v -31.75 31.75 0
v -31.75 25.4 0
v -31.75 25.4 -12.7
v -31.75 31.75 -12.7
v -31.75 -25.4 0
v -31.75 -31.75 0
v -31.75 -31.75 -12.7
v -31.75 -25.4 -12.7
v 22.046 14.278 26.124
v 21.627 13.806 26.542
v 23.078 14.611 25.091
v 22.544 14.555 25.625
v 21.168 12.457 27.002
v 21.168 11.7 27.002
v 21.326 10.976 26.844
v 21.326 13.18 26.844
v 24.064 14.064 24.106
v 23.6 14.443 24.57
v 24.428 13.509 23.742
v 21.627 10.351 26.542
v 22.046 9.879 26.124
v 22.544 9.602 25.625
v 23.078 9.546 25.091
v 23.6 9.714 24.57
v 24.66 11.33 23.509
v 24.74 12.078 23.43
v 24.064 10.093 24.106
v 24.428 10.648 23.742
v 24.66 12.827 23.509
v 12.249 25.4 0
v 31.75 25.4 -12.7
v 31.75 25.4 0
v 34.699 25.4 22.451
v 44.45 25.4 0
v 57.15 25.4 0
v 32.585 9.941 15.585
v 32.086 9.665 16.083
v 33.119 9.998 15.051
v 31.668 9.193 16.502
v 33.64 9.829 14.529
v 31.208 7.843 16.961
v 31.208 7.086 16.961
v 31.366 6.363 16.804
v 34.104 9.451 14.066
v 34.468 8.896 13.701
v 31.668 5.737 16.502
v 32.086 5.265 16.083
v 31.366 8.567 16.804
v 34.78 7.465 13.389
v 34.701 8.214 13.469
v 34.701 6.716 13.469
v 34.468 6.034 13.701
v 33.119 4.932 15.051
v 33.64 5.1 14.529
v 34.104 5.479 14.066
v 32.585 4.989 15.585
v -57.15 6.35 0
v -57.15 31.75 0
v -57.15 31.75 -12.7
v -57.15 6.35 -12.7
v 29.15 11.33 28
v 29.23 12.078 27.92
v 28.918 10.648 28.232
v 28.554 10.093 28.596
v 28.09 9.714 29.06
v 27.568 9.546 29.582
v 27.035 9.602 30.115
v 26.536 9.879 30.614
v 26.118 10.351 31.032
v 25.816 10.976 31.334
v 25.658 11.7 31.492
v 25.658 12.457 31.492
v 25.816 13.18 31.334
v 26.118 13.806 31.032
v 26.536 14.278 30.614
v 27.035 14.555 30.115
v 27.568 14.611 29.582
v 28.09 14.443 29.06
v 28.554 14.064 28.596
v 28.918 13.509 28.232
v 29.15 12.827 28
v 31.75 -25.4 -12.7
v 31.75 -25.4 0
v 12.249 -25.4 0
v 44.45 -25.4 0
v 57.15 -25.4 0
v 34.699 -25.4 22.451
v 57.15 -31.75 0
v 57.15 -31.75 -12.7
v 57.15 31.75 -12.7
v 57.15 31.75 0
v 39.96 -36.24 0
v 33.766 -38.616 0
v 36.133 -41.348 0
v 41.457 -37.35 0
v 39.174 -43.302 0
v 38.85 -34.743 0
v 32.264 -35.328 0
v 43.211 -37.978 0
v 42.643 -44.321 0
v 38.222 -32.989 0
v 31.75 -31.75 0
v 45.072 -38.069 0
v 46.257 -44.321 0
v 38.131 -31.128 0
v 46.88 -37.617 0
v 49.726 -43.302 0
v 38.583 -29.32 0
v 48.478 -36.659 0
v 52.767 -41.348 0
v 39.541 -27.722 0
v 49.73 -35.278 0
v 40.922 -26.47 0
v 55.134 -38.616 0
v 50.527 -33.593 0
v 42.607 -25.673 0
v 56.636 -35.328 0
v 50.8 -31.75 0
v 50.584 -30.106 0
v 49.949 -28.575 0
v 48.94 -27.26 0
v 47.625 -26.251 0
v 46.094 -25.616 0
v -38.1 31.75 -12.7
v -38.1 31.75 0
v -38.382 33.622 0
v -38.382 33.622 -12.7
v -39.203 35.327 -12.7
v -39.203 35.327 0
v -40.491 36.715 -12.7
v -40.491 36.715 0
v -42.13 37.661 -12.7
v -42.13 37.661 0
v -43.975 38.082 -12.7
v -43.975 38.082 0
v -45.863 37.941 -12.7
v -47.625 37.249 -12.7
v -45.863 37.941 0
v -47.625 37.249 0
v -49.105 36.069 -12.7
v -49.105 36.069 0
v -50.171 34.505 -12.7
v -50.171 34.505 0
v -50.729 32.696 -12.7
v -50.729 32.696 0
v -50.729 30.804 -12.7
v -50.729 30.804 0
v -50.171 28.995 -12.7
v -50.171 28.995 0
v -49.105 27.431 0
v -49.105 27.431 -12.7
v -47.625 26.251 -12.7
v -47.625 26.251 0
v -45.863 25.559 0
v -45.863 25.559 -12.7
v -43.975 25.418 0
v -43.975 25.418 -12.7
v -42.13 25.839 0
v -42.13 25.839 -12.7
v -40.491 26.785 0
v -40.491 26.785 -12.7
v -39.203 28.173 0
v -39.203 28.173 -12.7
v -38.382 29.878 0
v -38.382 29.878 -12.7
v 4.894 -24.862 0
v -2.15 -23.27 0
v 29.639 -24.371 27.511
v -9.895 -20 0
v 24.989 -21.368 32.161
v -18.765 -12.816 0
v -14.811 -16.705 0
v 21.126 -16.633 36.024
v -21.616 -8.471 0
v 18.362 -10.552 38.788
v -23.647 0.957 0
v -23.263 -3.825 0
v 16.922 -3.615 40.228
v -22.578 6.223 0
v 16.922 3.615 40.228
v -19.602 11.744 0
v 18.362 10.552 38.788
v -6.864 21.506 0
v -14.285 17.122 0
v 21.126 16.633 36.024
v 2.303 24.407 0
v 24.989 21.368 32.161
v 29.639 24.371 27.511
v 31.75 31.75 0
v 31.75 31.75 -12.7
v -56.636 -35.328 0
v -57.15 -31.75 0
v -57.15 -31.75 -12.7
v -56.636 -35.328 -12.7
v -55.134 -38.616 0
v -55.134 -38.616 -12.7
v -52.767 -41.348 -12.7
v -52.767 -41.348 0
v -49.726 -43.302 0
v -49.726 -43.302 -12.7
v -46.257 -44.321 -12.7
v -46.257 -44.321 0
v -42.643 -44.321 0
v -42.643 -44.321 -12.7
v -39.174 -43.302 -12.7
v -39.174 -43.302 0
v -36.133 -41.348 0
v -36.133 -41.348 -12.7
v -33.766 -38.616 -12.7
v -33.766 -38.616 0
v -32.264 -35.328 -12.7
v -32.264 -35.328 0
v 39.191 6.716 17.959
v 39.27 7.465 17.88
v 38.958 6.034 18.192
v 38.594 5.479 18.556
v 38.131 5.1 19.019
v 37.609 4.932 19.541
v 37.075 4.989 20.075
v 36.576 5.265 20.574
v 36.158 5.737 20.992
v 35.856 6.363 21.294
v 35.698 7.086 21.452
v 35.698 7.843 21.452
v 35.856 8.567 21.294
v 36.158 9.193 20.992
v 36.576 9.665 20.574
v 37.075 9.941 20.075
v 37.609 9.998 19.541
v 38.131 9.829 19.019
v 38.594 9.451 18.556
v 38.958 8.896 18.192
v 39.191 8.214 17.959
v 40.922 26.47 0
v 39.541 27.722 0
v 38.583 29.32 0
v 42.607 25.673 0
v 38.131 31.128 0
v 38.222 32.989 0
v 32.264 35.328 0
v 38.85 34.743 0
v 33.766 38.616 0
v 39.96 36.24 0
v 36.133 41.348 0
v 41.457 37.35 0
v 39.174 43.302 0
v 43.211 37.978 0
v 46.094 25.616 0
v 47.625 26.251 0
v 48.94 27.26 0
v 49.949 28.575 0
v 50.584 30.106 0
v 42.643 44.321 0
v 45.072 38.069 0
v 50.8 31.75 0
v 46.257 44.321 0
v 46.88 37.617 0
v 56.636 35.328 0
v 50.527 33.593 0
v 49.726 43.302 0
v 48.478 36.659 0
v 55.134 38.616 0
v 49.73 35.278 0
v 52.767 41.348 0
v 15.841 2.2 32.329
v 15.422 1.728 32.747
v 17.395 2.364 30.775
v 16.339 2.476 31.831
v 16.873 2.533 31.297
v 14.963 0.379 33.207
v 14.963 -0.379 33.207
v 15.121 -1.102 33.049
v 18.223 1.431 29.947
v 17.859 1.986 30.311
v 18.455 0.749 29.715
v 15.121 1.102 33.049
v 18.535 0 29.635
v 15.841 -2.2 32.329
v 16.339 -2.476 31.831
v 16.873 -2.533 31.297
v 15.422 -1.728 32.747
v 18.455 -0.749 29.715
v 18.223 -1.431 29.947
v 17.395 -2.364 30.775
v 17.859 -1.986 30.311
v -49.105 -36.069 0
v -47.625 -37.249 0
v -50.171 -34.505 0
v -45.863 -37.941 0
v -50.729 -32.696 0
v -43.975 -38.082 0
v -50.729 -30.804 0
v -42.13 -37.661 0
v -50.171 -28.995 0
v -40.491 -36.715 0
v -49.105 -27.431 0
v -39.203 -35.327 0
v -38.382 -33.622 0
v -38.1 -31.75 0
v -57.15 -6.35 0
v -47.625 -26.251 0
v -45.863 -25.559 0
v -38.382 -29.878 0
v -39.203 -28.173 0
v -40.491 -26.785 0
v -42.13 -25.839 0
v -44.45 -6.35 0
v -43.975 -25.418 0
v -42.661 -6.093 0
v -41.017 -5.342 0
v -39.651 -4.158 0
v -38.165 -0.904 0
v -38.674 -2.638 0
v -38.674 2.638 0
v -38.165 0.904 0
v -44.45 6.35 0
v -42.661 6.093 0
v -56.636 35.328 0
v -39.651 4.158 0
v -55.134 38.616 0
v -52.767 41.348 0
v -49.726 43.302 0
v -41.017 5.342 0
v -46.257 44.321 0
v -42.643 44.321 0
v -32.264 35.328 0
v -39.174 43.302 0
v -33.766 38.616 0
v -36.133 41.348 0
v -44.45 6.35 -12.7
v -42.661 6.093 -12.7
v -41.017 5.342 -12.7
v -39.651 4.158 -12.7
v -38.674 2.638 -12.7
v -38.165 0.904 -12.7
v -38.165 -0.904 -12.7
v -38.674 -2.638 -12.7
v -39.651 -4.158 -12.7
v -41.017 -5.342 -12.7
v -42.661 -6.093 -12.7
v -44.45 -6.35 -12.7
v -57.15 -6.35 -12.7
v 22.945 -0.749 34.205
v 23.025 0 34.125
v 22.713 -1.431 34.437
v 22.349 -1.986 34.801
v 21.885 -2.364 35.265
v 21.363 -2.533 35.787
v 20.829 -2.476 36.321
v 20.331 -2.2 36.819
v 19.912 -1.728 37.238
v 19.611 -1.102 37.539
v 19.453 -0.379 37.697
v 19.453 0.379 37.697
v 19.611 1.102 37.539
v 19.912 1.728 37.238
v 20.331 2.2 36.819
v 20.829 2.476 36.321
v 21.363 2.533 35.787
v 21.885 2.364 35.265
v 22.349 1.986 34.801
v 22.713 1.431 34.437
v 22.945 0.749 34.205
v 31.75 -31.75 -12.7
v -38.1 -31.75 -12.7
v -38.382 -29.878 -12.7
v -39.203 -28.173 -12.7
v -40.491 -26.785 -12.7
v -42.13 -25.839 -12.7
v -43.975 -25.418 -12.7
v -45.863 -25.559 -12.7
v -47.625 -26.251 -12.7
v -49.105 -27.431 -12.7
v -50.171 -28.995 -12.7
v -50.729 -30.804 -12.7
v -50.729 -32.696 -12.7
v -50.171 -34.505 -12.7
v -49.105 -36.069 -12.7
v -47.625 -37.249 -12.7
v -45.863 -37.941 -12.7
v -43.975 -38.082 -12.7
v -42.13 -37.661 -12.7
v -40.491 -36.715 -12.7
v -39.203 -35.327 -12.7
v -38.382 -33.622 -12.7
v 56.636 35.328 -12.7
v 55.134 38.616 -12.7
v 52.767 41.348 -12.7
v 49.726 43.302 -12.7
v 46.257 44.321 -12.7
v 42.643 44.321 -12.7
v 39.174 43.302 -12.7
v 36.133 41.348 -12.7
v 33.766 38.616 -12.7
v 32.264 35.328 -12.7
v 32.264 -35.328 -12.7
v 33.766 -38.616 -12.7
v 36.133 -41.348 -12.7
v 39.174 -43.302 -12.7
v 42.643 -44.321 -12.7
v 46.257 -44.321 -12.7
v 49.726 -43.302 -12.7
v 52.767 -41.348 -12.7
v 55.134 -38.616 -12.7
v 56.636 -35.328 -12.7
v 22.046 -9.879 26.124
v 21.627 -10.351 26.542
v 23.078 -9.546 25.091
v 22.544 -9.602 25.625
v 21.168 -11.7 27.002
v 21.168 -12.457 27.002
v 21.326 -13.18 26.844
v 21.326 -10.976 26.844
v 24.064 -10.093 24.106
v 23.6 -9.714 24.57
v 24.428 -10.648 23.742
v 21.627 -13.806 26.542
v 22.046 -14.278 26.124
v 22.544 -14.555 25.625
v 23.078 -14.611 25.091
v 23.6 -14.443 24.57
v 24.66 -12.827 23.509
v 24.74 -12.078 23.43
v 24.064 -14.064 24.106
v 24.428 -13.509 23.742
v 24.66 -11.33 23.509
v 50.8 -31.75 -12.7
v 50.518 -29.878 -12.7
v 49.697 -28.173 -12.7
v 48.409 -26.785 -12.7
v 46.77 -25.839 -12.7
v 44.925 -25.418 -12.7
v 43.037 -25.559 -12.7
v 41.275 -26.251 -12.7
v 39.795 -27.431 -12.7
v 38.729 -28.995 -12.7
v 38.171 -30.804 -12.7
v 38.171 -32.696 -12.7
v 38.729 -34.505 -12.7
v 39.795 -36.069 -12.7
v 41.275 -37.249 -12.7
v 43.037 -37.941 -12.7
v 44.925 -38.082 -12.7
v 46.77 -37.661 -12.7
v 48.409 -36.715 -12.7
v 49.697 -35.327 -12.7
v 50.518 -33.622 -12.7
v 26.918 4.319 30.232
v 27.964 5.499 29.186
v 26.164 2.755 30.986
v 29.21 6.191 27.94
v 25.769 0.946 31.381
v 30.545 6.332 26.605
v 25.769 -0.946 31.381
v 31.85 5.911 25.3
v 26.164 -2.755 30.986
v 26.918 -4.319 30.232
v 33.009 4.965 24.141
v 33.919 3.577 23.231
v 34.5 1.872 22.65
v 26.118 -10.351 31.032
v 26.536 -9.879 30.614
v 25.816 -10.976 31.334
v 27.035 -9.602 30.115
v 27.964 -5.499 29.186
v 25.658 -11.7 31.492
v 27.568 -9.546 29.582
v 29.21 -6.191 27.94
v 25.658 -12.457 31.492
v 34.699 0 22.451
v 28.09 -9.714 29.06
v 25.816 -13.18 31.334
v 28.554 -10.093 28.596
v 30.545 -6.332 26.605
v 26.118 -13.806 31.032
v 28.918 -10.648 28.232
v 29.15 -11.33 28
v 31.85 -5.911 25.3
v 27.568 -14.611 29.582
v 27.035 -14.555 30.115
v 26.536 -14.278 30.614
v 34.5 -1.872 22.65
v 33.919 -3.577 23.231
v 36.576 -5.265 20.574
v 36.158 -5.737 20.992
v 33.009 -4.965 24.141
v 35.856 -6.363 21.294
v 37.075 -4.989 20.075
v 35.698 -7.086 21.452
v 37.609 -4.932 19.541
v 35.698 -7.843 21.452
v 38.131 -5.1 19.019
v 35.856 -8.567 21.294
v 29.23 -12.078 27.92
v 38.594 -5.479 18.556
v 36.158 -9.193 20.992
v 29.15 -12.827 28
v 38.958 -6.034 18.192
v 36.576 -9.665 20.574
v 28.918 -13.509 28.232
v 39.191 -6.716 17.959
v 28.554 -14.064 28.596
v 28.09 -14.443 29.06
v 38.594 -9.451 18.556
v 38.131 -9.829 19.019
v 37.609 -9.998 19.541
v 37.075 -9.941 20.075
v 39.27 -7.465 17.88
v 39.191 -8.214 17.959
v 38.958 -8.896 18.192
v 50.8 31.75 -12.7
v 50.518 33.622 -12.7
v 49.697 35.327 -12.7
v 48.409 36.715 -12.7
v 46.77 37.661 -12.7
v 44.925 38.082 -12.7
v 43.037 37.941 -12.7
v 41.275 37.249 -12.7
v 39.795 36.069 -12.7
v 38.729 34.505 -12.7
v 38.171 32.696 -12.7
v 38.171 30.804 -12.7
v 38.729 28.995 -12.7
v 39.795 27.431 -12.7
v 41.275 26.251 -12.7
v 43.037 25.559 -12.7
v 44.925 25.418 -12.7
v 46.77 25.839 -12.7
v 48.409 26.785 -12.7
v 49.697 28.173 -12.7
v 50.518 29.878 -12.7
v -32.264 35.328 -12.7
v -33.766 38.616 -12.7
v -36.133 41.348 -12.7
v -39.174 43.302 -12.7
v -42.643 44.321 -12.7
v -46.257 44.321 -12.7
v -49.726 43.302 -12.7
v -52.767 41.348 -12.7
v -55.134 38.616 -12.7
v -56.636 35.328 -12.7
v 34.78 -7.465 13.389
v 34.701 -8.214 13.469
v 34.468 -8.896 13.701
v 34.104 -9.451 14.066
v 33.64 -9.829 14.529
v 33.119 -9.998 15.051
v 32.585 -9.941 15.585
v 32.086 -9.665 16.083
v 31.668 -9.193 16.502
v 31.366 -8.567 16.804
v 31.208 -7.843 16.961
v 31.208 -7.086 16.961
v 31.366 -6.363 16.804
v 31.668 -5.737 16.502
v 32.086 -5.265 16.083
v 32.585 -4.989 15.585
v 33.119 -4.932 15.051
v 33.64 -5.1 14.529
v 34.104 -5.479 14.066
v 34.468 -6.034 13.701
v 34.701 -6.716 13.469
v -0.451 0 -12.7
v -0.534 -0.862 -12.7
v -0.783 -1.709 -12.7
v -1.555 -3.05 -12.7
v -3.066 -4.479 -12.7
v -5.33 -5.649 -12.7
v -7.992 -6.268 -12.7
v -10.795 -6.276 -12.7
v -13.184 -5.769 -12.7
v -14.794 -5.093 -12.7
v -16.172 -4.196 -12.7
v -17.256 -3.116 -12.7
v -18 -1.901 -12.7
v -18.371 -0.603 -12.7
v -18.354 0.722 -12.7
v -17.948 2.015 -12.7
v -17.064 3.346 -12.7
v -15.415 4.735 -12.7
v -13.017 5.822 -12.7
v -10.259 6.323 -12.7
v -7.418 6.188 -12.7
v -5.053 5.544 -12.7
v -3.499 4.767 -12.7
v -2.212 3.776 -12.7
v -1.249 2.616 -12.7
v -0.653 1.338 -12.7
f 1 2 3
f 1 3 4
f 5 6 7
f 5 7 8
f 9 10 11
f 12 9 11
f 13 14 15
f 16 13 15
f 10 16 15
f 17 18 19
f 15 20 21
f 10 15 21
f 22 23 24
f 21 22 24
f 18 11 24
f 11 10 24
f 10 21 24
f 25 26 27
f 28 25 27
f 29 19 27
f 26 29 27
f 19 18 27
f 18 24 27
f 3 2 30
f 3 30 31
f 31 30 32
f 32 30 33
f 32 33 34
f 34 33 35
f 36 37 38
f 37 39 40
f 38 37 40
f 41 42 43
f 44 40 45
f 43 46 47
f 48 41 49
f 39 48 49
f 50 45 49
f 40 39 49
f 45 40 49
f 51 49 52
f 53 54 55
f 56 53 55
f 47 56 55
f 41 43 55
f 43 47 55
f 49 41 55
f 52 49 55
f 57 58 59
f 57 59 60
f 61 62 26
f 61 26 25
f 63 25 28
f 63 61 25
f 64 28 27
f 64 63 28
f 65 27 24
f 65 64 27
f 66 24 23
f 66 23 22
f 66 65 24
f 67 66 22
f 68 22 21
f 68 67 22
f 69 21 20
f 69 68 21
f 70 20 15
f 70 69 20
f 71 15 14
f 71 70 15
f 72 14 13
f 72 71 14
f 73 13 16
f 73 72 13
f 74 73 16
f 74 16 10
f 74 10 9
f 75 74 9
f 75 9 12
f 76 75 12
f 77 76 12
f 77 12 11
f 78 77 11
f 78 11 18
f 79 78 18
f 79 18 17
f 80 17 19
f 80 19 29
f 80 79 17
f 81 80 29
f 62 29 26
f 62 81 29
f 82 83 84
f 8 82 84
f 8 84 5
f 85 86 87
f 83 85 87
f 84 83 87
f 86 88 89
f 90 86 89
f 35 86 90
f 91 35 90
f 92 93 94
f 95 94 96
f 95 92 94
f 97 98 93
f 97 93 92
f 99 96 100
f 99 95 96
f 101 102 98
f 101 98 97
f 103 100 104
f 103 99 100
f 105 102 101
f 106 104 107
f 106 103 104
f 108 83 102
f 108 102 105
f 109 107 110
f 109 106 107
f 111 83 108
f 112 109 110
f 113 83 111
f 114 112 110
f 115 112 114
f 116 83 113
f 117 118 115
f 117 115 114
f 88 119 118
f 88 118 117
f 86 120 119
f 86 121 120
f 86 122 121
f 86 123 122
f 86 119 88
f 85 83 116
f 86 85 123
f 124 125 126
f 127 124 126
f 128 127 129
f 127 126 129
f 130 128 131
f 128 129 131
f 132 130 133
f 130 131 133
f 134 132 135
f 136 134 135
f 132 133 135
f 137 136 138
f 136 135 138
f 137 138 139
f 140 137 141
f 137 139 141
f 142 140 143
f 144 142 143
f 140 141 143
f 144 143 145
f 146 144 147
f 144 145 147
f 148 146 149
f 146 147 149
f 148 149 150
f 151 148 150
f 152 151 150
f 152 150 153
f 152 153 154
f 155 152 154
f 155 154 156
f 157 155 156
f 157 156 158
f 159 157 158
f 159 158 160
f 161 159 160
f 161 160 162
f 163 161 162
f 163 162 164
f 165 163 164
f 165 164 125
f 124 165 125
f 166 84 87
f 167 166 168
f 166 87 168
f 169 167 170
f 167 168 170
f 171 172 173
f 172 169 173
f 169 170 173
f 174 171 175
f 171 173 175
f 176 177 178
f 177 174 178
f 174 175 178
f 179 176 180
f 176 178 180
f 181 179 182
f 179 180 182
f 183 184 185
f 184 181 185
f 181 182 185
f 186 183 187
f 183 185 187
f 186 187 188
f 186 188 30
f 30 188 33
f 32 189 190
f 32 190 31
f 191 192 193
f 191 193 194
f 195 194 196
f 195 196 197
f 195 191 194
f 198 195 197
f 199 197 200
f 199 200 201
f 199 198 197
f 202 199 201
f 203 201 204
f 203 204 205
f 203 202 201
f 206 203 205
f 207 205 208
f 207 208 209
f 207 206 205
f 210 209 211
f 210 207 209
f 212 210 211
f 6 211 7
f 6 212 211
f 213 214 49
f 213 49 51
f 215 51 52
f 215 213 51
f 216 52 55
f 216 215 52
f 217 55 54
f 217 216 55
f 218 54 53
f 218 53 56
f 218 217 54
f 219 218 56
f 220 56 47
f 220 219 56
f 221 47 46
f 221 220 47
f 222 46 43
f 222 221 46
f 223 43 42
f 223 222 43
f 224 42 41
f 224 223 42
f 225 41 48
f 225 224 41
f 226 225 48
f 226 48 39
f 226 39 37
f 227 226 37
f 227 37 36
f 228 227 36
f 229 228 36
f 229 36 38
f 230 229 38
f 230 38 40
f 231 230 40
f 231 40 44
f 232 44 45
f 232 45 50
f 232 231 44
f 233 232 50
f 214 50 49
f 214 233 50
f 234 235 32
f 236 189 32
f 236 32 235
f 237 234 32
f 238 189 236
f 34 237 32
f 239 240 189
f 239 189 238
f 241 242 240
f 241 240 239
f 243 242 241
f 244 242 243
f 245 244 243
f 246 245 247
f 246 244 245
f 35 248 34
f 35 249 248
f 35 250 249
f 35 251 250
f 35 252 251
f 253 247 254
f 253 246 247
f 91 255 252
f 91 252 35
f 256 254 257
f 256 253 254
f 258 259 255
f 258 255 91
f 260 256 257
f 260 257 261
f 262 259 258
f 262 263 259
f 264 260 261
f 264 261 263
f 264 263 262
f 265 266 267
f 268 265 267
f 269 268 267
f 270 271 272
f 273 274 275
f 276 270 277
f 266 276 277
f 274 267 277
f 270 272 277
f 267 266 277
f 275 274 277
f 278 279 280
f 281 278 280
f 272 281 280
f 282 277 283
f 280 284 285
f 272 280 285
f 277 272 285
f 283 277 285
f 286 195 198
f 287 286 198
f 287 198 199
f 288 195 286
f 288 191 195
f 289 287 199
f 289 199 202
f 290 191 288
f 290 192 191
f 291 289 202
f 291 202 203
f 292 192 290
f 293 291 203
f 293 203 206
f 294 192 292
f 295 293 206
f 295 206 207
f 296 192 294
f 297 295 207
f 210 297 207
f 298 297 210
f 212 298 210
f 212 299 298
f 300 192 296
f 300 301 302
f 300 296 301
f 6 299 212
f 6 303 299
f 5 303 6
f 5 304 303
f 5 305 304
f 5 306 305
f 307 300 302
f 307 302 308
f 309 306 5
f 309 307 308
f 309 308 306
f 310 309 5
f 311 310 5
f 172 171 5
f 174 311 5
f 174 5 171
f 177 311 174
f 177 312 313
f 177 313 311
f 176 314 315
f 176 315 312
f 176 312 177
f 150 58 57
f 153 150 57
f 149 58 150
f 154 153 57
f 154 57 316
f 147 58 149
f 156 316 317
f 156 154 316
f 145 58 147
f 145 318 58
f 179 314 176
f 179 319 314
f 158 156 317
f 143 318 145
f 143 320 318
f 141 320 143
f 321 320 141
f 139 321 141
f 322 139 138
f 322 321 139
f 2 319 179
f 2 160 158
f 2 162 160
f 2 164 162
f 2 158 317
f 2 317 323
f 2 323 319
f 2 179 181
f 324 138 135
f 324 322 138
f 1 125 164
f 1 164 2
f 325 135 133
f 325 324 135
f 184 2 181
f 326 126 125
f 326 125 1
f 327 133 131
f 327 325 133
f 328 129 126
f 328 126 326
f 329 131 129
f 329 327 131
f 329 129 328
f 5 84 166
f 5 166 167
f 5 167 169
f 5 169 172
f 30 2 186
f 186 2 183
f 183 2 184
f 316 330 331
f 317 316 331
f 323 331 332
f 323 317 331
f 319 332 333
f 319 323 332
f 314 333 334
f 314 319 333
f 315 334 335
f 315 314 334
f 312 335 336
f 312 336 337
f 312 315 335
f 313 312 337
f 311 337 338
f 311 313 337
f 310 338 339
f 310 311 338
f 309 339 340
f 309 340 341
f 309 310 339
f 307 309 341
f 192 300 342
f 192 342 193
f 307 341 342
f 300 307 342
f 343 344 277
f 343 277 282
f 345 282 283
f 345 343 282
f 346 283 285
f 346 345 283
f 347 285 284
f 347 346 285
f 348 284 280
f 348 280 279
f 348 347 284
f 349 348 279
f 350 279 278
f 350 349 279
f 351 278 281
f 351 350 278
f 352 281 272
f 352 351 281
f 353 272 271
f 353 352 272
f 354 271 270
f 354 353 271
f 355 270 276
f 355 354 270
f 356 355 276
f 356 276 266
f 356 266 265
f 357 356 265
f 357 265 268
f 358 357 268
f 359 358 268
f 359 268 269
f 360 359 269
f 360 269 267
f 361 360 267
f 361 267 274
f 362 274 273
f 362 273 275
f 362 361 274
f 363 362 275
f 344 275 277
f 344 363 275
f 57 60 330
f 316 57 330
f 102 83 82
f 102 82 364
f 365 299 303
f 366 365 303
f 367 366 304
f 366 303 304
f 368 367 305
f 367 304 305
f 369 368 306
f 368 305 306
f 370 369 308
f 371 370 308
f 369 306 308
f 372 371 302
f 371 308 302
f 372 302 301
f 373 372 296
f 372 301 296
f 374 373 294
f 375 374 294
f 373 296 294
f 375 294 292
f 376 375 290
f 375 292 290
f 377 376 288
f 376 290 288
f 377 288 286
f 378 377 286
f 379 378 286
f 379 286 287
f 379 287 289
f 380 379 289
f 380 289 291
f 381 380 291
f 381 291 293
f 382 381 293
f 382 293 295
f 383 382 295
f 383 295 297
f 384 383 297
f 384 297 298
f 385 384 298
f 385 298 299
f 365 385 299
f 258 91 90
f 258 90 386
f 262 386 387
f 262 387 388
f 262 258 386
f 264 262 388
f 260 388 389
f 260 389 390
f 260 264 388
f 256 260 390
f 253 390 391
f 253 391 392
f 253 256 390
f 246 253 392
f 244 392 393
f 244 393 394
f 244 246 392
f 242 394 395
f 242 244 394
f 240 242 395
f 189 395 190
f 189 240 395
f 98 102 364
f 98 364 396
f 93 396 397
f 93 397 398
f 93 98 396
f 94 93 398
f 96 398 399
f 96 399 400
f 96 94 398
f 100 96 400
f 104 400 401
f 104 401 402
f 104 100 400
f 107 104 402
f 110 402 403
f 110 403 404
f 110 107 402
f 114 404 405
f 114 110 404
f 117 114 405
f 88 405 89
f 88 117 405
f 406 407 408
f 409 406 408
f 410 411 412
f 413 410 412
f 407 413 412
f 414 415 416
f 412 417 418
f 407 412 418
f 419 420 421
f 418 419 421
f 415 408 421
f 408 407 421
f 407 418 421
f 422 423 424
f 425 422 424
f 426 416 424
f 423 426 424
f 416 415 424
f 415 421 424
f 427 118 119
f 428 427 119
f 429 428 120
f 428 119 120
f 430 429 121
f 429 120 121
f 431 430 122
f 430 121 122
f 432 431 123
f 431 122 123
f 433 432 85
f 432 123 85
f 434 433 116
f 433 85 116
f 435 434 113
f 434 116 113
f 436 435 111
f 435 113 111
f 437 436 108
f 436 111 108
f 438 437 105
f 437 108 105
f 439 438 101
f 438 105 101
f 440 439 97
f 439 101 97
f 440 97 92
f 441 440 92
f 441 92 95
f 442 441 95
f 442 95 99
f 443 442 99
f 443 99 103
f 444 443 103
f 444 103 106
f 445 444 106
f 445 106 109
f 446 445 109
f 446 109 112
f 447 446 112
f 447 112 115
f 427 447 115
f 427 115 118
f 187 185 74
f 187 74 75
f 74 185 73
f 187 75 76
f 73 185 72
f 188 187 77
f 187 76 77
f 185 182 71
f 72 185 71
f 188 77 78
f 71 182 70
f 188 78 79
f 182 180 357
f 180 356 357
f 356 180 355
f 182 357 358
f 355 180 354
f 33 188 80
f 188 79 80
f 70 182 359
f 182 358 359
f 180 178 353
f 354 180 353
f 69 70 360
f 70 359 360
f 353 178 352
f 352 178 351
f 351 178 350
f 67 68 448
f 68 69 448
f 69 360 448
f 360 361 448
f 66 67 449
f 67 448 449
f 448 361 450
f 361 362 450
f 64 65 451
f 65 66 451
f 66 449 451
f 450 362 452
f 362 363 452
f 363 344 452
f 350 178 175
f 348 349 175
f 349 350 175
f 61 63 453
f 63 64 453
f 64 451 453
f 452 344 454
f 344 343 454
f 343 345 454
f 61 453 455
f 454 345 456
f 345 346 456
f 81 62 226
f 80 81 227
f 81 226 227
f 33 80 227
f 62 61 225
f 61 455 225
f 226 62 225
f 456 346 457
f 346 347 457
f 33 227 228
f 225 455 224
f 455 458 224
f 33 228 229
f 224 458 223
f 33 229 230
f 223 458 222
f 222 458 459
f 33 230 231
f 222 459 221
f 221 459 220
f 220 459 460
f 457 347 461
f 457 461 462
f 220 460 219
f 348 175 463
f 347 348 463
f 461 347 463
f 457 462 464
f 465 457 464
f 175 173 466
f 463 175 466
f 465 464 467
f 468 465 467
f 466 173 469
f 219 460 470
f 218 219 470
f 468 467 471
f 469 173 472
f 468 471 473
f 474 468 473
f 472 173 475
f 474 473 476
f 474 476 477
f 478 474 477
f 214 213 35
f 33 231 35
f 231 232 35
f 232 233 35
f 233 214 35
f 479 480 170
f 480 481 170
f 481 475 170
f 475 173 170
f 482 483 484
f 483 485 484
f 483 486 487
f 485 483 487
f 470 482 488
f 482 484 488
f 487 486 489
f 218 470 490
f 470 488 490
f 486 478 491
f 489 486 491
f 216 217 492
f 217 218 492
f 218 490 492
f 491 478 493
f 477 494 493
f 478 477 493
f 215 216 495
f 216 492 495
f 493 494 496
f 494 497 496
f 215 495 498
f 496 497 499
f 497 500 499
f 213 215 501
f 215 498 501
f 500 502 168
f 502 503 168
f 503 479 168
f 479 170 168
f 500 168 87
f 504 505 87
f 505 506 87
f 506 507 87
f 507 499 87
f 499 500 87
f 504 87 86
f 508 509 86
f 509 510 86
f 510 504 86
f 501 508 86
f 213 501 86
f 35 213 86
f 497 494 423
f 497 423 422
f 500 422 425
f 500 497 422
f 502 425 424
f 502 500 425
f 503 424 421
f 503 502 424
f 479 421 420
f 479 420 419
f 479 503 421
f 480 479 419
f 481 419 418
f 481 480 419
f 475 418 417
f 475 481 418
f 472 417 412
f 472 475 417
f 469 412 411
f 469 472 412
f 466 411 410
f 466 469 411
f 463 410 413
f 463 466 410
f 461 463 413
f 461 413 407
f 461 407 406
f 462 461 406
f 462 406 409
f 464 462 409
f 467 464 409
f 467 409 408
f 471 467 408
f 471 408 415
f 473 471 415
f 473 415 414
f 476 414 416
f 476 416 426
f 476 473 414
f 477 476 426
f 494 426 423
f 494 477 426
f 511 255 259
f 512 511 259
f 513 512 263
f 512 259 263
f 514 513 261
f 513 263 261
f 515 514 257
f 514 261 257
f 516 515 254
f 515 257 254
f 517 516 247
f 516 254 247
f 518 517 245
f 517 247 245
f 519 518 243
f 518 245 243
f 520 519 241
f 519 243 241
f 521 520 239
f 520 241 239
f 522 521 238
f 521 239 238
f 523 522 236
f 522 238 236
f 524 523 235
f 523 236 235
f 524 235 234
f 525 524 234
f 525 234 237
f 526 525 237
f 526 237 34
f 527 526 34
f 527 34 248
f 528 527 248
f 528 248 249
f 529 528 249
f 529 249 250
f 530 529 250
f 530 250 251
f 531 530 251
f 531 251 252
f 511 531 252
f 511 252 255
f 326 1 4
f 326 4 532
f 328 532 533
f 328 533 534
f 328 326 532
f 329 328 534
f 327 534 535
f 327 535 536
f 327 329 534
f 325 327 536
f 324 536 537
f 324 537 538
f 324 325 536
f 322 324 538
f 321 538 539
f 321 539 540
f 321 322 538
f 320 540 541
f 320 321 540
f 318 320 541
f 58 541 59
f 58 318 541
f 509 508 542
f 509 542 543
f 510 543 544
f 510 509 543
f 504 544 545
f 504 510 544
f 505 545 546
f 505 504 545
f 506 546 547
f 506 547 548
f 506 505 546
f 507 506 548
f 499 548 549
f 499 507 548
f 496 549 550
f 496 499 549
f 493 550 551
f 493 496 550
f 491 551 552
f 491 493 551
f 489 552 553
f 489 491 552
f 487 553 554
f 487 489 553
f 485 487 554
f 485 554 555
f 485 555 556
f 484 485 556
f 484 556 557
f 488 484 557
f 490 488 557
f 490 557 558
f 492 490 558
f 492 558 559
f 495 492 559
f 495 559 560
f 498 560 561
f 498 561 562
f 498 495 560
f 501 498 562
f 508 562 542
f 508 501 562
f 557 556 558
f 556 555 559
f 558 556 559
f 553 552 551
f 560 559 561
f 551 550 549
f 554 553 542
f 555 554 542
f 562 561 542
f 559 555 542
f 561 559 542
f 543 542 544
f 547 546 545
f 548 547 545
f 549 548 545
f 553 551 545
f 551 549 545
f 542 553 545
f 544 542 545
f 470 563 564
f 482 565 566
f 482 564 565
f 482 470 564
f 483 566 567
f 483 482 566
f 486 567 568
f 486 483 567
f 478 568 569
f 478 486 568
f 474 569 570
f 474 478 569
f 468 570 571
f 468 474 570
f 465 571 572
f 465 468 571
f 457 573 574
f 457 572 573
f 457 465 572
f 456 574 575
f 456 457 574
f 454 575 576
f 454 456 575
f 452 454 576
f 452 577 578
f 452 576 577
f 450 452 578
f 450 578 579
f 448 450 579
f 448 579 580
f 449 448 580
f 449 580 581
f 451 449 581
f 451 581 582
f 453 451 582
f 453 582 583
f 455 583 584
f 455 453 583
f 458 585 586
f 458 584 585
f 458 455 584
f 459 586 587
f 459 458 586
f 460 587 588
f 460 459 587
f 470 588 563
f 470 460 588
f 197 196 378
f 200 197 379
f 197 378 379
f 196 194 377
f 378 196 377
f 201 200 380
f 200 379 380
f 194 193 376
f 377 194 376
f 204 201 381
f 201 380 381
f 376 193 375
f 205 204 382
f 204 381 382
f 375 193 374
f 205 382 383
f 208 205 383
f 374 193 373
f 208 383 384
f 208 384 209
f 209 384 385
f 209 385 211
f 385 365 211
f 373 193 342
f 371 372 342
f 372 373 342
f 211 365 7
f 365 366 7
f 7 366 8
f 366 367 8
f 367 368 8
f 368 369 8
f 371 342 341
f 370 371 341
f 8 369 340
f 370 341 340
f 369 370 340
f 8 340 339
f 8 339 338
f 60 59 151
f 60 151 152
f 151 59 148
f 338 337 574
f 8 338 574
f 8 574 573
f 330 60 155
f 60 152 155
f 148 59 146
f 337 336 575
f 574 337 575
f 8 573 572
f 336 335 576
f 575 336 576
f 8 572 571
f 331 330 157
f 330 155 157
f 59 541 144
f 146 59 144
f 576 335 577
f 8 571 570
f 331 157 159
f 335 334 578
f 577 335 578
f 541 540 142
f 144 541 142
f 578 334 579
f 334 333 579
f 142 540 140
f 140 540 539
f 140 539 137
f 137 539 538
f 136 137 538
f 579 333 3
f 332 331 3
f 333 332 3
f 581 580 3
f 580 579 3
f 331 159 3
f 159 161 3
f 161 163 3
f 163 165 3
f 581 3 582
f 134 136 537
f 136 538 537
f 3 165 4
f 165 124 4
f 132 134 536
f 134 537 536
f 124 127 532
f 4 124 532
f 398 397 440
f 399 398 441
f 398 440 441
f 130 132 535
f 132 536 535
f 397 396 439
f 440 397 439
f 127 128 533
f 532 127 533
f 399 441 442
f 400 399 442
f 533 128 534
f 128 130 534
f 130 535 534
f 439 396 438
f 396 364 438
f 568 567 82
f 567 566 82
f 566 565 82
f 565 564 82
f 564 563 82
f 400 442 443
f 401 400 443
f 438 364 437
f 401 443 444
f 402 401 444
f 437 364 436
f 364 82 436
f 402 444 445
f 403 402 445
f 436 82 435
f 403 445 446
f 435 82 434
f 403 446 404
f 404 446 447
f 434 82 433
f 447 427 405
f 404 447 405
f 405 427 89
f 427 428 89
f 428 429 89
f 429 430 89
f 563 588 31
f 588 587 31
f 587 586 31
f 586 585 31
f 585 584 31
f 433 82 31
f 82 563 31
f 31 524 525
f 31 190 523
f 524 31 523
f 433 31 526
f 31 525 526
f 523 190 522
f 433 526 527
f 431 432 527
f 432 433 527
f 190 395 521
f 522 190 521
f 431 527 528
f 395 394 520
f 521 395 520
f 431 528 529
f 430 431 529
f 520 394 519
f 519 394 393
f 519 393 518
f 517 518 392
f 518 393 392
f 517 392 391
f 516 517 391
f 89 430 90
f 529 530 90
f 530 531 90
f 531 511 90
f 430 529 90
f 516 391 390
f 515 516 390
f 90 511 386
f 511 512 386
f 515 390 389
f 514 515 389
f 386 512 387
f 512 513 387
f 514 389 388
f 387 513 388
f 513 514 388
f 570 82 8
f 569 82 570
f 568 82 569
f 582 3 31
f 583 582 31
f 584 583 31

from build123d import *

# Parameters (mm, degrees)
F1_R      = 6.35
F2_DEPTH  = 12.7
F4_DEPTH  = 12.701
F8_R      = 2.54
F10_DEPTH = 6.35
F9_R      = 6.35
F11_DEPTH = 89.8035612107


with BuildPart() as f2:
    # F1 (on Top) → F2 (new body)
    with BuildSketch(Plane.XY):
        with BuildLine():
            ThreePointArc((-31.75, 31.75), (-44.45, 44.45), (-57.15, 31.75))
            Line((-57.15, 31.75), (-57.15, 6.35))
            Line((-57.15, 6.35), (-44.45, 6.35))
            ThreePointArc((-44.45, 6.35), (-38.1, 0), (-44.45, -6.35))
            Line((-44.45, -6.35), (-57.15, -6.35))
            Line((-57.15, -6.35), (-57.15, -31.75))
            ThreePointArc((-57.15, -31.75), (-44.45, -44.45), (-31.75, -31.75))
            Line((-31.75, -31.75), (-31.75, -25.4))
            Line((-31.75, -25.4), (31.75, -25.4))
            Line((31.75, -25.4), (31.75, -31.75))
            ThreePointArc((31.75, -31.75), (44.45, -44.45), (57.15, -31.75))
            Line((57.15, -31.75), (57.15, 31.75))
            ThreePointArc((57.15, 31.75), (44.45, 44.45), (31.75, 31.75))
            Line((31.75, 31.75), (31.75, 25.4))
            Line((31.75, 25.4), (-31.75, 25.4))
            Line((-31.75, 25.4), (-31.75, 31.75))
        make_face()
        with Locations((-44.45, -31.75)):
            Circle(F1_R, mode=Mode.SUBTRACT)
        with Locations((44.45, -31.75)):
            Circle(F1_R, mode=Mode.SUBTRACT)
        with Locations((-44.45, 31.75)):
            Circle(F1_R, mode=Mode.SUBTRACT)
        with Locations((44.45, 31.75)):
            Circle(F1_R, mode=Mode.SUBTRACT)
        with Locations((-44.45, -31.75)):
            Circle(F1_R)
        with Locations((-44.45, 31.75)):
            Circle(F1_R)
        with Locations((44.45, 31.75)):
            Circle(F1_R)
        with Locations((44.45, -31.75)):
            Circle(F1_R)
    extrude(amount=-F2_DEPTH)

    # F1 (on Top) → F4 (cut, through all)
    with BuildSketch(Plane.XY):
        with Locations((-44.45, -31.75)):
            Circle(F1_R)
        with Locations((-44.45, 31.75)):
            Circle(F1_R)
        with Locations((44.45, 31.75)):
            Circle(F1_R)
        with Locations((44.45, -31.75)):
            Circle(F1_R)
    extrude(amount=-F4_DEPTH, mode=Mode.SUBTRACT)

    # F6 (on face) → F7 (join, up to the next surface of F2)
    with BuildSketch(Plane(origin=(28.575, 0, 28.575), x_dir=(0.7071067812, 0, -0.7071067812), z_dir=(-0.7071067812, 0, -0.7071067812))):
        with BuildLine():
            Line((40.4111525448, -25.4), (40.4111525448, 25.4))
            Line((40.4111525448, 25.4), (8.6611525448, 25.4))
            ThreePointArc((8.6611525448, 25.4), (-16.7388474552, 0), (8.6611525448, -25.4))
            Line((8.6611525448, -25.4), (40.4111525448, -25.4))
        make_face()
    extrude(until=Until.NEXT)

    # F8 (on face) → F10 (cut)
    with BuildSketch(Plane(origin=(28.575, 0, 28.575), x_dir=(0.7071067812, 0, -0.7071067812), z_dir=(-0.7071067812, 0, -0.7071067812))):
        with Locations((-10.3888474552, 0)):
            Circle(F8_R)
        with Locations((-1.6133632838, -12.0784177569)):
            Circle(F8_R)
        with Locations((12.5856683734, -7.4648727041)):
            Circle(F8_R)
        with Locations((12.5856683734, 7.4648727041)):
            Circle(F8_R)
        with Locations((-1.6133632838, 12.0784177569)):
            Circle(F8_R)
    extrude(amount=F10_DEPTH, mode=Mode.SUBTRACT)

    # F9 (on face) → F11 (cut, through all)
    with BuildSketch(Plane(origin=(28.575, 0, 28.575), x_dir=(0.7071067812, 0, -0.7071067812), z_dir=(-0.7071067812, 0, -0.7071067812))):
        with Locations((2.3111525448, 0)):
            Circle(F9_R)
    extrude(amount=F11_DEPTH, mode=Mode.SUBTRACT)


solid = f2.part
